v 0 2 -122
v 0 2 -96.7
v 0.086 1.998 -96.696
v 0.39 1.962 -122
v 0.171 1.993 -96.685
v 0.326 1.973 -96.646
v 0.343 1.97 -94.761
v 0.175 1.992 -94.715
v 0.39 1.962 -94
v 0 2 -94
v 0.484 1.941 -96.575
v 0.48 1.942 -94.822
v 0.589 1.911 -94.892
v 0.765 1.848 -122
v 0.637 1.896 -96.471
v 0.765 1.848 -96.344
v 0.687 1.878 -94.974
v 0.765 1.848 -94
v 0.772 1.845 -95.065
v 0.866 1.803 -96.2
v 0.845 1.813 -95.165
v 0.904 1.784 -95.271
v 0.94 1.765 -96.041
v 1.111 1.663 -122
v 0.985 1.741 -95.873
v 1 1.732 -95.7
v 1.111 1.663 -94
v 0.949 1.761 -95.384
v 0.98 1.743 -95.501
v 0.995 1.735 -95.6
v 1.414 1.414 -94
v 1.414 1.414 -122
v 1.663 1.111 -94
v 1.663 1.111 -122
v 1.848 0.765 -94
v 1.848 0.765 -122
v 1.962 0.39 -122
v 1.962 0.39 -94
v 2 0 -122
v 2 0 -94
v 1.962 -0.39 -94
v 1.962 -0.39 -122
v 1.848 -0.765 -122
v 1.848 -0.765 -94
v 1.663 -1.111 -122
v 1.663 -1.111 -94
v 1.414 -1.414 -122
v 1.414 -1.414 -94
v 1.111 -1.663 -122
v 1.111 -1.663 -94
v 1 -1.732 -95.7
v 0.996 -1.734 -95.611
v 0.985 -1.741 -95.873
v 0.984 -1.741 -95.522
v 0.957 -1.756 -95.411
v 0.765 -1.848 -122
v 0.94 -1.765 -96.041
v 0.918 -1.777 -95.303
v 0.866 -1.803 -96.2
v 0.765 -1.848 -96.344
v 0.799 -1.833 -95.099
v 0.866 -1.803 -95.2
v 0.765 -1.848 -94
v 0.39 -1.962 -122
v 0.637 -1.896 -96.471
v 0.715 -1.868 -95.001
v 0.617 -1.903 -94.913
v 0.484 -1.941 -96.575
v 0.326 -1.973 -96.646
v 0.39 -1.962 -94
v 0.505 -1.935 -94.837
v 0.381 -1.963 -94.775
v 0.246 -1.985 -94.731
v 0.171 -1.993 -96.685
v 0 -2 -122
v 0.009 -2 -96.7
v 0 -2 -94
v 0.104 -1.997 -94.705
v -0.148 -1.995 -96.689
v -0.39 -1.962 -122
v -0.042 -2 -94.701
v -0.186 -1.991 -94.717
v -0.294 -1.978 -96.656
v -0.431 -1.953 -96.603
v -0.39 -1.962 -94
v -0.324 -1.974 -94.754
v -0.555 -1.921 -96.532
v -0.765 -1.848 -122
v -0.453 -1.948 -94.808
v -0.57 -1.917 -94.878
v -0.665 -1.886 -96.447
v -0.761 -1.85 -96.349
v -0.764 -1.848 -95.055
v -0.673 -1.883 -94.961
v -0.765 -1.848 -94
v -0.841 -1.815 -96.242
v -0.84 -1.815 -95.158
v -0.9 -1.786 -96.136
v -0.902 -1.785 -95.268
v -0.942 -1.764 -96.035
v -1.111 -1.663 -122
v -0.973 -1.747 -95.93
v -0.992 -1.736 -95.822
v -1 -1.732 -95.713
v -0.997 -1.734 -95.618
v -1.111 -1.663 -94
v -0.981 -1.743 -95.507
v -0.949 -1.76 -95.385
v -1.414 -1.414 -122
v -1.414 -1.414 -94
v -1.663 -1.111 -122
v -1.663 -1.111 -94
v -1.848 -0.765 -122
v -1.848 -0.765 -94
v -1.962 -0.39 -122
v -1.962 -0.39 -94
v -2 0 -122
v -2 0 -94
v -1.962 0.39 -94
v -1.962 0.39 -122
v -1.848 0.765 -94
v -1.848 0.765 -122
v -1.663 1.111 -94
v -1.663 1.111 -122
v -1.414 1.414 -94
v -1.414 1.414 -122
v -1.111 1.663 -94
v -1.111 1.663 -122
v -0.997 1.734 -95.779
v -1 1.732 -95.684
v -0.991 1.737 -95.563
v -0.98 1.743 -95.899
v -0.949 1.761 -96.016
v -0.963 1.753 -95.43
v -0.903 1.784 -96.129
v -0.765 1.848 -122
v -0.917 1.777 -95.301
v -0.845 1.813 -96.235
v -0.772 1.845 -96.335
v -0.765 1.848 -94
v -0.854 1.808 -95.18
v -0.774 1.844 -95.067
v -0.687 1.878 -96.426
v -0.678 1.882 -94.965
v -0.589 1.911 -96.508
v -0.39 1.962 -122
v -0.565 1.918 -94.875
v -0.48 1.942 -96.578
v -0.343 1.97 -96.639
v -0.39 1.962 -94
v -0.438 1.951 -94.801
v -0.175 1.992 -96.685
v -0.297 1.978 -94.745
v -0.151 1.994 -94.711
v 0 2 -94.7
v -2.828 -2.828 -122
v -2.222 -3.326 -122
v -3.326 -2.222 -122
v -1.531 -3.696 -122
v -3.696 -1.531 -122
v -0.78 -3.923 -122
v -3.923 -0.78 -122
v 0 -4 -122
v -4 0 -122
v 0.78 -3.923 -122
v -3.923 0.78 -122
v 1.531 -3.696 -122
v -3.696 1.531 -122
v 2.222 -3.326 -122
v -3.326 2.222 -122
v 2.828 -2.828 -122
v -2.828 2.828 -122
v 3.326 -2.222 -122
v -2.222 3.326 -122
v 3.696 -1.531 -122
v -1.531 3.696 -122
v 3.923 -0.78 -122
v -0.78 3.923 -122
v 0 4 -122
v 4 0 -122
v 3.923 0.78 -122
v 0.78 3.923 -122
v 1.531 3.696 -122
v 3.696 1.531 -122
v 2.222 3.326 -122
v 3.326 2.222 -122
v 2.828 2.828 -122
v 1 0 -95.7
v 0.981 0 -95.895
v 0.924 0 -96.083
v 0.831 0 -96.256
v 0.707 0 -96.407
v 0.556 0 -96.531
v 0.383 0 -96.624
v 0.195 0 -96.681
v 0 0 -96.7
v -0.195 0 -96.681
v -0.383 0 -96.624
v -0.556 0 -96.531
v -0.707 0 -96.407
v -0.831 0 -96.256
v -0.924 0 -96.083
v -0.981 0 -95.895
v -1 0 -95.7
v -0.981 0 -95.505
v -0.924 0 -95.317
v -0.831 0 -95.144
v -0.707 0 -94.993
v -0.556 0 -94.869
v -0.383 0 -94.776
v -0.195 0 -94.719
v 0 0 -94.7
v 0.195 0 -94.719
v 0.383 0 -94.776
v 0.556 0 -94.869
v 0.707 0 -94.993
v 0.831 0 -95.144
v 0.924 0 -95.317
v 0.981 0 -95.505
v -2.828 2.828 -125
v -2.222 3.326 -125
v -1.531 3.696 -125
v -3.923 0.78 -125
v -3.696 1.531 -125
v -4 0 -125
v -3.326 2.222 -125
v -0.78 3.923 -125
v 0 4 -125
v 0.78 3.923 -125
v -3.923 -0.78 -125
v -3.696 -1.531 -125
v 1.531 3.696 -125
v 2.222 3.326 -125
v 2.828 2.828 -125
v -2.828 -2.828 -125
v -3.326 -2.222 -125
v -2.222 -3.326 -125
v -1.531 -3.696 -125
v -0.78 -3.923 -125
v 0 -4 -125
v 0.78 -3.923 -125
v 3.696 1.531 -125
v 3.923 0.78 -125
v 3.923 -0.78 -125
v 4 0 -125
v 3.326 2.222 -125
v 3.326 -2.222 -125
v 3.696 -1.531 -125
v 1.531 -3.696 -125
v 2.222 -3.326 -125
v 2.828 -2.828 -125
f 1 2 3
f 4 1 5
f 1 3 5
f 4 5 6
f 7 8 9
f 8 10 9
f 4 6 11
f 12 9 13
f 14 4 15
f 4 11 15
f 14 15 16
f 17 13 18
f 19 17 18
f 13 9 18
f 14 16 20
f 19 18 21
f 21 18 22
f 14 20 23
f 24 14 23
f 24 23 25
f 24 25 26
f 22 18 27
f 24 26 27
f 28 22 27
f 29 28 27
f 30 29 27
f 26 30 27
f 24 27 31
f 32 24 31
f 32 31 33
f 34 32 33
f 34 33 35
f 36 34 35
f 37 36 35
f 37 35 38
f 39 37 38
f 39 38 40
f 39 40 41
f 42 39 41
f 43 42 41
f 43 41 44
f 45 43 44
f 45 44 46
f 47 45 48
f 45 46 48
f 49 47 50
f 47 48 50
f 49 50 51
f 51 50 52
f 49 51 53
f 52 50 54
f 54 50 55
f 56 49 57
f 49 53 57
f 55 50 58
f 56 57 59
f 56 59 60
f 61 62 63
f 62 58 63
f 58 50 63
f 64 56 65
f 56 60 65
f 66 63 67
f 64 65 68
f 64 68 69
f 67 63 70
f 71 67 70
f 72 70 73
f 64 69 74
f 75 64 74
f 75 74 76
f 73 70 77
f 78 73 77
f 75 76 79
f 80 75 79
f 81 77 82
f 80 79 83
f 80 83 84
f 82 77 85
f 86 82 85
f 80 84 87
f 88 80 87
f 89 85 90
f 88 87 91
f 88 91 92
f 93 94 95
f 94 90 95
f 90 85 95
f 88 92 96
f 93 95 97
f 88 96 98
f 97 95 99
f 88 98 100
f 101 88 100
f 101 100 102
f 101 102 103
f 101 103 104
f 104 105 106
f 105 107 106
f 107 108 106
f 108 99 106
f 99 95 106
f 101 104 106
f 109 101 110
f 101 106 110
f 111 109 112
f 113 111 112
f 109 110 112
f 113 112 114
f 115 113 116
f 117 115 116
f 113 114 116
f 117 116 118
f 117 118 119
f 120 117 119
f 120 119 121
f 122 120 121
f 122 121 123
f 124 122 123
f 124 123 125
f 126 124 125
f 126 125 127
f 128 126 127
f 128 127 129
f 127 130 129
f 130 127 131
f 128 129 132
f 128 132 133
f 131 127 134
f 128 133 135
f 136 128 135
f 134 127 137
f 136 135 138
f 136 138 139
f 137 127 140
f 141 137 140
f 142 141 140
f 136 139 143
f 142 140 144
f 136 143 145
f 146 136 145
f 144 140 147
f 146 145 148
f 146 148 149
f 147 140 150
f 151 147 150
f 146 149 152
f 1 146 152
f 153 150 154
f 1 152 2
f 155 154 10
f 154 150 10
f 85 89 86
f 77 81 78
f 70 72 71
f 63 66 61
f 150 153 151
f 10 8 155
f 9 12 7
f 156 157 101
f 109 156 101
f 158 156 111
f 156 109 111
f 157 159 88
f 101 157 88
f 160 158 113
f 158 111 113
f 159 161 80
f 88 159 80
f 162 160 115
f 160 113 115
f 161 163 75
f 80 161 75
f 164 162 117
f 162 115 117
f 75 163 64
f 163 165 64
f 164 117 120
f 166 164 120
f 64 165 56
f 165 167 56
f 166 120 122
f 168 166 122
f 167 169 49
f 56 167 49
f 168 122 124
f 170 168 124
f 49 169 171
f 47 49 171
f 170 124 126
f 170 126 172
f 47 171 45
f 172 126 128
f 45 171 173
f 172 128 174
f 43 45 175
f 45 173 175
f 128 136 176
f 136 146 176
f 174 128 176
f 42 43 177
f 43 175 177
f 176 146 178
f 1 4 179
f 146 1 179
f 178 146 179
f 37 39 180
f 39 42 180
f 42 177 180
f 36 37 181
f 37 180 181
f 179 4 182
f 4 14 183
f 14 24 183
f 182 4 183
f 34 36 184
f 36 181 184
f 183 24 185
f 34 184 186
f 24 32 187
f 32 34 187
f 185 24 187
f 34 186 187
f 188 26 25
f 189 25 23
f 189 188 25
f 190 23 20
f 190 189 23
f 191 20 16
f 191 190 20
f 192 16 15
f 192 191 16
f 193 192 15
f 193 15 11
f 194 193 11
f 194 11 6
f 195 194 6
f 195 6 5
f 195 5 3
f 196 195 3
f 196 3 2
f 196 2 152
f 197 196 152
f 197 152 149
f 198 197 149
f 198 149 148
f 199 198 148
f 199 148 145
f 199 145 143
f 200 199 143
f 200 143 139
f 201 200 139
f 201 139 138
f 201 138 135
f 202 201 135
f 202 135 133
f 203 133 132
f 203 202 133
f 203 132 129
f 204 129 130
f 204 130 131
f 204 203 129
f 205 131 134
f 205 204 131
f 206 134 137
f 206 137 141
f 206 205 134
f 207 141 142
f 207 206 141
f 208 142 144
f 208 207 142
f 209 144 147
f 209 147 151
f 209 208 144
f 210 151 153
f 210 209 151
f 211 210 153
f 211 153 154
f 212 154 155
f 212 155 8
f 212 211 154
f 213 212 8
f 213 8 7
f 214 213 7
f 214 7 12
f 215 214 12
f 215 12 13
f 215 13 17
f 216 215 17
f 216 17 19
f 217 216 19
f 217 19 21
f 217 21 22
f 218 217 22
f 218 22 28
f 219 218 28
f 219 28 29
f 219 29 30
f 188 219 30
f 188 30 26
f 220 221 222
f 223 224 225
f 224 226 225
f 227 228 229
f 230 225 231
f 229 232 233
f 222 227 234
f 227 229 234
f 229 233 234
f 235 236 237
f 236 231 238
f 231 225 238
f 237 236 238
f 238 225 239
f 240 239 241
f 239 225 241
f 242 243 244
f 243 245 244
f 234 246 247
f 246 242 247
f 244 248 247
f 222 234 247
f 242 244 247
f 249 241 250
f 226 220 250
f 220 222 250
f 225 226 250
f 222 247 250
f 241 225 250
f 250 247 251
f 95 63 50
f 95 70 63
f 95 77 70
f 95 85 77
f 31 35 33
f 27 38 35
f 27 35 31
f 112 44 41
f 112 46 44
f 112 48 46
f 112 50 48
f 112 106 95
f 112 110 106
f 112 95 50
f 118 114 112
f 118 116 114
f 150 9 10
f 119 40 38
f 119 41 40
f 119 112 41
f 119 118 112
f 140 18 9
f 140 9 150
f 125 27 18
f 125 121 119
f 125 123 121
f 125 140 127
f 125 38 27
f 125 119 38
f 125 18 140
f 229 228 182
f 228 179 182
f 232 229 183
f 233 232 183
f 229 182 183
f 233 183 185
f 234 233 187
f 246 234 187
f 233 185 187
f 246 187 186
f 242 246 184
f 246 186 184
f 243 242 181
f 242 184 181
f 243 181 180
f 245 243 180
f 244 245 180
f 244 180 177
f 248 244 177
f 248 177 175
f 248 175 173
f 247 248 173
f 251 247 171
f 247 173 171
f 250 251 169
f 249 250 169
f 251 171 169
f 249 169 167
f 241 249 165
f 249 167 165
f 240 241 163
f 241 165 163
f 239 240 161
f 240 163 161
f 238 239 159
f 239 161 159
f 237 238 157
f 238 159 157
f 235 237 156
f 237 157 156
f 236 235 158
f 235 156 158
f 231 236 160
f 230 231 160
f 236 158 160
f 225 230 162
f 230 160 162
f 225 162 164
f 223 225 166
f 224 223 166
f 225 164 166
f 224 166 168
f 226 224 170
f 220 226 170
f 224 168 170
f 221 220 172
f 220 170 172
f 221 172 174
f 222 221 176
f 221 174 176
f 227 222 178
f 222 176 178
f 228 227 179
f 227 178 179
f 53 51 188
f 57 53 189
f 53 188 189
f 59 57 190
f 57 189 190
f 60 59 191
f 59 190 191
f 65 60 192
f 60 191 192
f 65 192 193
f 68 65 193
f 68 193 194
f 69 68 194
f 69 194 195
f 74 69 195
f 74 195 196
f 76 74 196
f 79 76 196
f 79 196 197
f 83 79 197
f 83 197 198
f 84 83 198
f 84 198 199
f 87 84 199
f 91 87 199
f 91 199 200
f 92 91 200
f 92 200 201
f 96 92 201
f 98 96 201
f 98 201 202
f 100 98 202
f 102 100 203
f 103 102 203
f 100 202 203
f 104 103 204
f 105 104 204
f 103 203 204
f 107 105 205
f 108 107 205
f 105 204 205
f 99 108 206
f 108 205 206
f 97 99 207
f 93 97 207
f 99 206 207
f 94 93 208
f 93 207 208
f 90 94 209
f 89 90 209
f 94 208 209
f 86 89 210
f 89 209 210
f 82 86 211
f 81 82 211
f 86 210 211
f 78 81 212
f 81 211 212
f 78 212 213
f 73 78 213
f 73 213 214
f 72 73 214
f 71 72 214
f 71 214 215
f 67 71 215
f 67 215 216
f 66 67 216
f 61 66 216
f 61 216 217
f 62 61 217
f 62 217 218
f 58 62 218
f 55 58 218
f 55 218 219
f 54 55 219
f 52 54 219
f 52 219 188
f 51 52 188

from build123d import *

# Parameters (mm, degrees)
SKETCH3_W               = 300
SKETCH3_H               = 7.83336639
CUT_EXTRUDE1_DEPTH      = 5
CUT_EXTRUDE1_DEPTH_BACK = 5
SKETCH4_R               = 1
CUT_EXTRUDE2_DEPTH      = 5
CUT_EXTRUDE2_DEPTH_BACK = 5


with BuildPart() as part:
    # Sketch2 → Revolve1 (revolve)
    with BuildSketch(Plane(origin=(0, 0, 0), x_dir=(0, 0, -1), z_dir=(1, 0, 0))):
        Polygon((125, 0), (125, 4), (122, 4), (122, 2), (-125, 2), (-125, 0), align=None)
    revolve(axis=Axis((0, 0, 125), (0, 0, -1)))

    # Sketch3 → Cut-Extrude1 (cut, two sides)
    with BuildSketch(Plane(origin=(0, 0, 0), x_dir=(0, 0, -1), z_dir=(1, 0, 0))) as cut_extrude1_sk:
        with Locations((-56, 0.150641661)):
            Rectangle(SKETCH3_W, SKETCH3_H)
    extrude(amount=CUT_EXTRUDE1_DEPTH, mode=Mode.SUBTRACT)
    extrude(cut_extrude1_sk.sketch, amount=-CUT_EXTRUDE1_DEPTH_BACK, mode=Mode.SUBTRACT)

    # Sketch4 → Cut-Extrude2 (cut, two sides)
    with BuildSketch(Plane(origin=(0, 0, 0), x_dir=(1, 0, 0), z_dir=(0, 1, 0))) as cut_extrude2_sk:
        with Locations((0, 95.7)):
            Circle(SKETCH4_R)
    extrude(amount=CUT_EXTRUDE2_DEPTH, mode=Mode.SUBTRACT)
    extrude(cut_extrude2_sk.sketch, amount=-CUT_EXTRUDE2_DEPTH_BACK, mode=Mode.SUBTRACT)


solid = part.part
